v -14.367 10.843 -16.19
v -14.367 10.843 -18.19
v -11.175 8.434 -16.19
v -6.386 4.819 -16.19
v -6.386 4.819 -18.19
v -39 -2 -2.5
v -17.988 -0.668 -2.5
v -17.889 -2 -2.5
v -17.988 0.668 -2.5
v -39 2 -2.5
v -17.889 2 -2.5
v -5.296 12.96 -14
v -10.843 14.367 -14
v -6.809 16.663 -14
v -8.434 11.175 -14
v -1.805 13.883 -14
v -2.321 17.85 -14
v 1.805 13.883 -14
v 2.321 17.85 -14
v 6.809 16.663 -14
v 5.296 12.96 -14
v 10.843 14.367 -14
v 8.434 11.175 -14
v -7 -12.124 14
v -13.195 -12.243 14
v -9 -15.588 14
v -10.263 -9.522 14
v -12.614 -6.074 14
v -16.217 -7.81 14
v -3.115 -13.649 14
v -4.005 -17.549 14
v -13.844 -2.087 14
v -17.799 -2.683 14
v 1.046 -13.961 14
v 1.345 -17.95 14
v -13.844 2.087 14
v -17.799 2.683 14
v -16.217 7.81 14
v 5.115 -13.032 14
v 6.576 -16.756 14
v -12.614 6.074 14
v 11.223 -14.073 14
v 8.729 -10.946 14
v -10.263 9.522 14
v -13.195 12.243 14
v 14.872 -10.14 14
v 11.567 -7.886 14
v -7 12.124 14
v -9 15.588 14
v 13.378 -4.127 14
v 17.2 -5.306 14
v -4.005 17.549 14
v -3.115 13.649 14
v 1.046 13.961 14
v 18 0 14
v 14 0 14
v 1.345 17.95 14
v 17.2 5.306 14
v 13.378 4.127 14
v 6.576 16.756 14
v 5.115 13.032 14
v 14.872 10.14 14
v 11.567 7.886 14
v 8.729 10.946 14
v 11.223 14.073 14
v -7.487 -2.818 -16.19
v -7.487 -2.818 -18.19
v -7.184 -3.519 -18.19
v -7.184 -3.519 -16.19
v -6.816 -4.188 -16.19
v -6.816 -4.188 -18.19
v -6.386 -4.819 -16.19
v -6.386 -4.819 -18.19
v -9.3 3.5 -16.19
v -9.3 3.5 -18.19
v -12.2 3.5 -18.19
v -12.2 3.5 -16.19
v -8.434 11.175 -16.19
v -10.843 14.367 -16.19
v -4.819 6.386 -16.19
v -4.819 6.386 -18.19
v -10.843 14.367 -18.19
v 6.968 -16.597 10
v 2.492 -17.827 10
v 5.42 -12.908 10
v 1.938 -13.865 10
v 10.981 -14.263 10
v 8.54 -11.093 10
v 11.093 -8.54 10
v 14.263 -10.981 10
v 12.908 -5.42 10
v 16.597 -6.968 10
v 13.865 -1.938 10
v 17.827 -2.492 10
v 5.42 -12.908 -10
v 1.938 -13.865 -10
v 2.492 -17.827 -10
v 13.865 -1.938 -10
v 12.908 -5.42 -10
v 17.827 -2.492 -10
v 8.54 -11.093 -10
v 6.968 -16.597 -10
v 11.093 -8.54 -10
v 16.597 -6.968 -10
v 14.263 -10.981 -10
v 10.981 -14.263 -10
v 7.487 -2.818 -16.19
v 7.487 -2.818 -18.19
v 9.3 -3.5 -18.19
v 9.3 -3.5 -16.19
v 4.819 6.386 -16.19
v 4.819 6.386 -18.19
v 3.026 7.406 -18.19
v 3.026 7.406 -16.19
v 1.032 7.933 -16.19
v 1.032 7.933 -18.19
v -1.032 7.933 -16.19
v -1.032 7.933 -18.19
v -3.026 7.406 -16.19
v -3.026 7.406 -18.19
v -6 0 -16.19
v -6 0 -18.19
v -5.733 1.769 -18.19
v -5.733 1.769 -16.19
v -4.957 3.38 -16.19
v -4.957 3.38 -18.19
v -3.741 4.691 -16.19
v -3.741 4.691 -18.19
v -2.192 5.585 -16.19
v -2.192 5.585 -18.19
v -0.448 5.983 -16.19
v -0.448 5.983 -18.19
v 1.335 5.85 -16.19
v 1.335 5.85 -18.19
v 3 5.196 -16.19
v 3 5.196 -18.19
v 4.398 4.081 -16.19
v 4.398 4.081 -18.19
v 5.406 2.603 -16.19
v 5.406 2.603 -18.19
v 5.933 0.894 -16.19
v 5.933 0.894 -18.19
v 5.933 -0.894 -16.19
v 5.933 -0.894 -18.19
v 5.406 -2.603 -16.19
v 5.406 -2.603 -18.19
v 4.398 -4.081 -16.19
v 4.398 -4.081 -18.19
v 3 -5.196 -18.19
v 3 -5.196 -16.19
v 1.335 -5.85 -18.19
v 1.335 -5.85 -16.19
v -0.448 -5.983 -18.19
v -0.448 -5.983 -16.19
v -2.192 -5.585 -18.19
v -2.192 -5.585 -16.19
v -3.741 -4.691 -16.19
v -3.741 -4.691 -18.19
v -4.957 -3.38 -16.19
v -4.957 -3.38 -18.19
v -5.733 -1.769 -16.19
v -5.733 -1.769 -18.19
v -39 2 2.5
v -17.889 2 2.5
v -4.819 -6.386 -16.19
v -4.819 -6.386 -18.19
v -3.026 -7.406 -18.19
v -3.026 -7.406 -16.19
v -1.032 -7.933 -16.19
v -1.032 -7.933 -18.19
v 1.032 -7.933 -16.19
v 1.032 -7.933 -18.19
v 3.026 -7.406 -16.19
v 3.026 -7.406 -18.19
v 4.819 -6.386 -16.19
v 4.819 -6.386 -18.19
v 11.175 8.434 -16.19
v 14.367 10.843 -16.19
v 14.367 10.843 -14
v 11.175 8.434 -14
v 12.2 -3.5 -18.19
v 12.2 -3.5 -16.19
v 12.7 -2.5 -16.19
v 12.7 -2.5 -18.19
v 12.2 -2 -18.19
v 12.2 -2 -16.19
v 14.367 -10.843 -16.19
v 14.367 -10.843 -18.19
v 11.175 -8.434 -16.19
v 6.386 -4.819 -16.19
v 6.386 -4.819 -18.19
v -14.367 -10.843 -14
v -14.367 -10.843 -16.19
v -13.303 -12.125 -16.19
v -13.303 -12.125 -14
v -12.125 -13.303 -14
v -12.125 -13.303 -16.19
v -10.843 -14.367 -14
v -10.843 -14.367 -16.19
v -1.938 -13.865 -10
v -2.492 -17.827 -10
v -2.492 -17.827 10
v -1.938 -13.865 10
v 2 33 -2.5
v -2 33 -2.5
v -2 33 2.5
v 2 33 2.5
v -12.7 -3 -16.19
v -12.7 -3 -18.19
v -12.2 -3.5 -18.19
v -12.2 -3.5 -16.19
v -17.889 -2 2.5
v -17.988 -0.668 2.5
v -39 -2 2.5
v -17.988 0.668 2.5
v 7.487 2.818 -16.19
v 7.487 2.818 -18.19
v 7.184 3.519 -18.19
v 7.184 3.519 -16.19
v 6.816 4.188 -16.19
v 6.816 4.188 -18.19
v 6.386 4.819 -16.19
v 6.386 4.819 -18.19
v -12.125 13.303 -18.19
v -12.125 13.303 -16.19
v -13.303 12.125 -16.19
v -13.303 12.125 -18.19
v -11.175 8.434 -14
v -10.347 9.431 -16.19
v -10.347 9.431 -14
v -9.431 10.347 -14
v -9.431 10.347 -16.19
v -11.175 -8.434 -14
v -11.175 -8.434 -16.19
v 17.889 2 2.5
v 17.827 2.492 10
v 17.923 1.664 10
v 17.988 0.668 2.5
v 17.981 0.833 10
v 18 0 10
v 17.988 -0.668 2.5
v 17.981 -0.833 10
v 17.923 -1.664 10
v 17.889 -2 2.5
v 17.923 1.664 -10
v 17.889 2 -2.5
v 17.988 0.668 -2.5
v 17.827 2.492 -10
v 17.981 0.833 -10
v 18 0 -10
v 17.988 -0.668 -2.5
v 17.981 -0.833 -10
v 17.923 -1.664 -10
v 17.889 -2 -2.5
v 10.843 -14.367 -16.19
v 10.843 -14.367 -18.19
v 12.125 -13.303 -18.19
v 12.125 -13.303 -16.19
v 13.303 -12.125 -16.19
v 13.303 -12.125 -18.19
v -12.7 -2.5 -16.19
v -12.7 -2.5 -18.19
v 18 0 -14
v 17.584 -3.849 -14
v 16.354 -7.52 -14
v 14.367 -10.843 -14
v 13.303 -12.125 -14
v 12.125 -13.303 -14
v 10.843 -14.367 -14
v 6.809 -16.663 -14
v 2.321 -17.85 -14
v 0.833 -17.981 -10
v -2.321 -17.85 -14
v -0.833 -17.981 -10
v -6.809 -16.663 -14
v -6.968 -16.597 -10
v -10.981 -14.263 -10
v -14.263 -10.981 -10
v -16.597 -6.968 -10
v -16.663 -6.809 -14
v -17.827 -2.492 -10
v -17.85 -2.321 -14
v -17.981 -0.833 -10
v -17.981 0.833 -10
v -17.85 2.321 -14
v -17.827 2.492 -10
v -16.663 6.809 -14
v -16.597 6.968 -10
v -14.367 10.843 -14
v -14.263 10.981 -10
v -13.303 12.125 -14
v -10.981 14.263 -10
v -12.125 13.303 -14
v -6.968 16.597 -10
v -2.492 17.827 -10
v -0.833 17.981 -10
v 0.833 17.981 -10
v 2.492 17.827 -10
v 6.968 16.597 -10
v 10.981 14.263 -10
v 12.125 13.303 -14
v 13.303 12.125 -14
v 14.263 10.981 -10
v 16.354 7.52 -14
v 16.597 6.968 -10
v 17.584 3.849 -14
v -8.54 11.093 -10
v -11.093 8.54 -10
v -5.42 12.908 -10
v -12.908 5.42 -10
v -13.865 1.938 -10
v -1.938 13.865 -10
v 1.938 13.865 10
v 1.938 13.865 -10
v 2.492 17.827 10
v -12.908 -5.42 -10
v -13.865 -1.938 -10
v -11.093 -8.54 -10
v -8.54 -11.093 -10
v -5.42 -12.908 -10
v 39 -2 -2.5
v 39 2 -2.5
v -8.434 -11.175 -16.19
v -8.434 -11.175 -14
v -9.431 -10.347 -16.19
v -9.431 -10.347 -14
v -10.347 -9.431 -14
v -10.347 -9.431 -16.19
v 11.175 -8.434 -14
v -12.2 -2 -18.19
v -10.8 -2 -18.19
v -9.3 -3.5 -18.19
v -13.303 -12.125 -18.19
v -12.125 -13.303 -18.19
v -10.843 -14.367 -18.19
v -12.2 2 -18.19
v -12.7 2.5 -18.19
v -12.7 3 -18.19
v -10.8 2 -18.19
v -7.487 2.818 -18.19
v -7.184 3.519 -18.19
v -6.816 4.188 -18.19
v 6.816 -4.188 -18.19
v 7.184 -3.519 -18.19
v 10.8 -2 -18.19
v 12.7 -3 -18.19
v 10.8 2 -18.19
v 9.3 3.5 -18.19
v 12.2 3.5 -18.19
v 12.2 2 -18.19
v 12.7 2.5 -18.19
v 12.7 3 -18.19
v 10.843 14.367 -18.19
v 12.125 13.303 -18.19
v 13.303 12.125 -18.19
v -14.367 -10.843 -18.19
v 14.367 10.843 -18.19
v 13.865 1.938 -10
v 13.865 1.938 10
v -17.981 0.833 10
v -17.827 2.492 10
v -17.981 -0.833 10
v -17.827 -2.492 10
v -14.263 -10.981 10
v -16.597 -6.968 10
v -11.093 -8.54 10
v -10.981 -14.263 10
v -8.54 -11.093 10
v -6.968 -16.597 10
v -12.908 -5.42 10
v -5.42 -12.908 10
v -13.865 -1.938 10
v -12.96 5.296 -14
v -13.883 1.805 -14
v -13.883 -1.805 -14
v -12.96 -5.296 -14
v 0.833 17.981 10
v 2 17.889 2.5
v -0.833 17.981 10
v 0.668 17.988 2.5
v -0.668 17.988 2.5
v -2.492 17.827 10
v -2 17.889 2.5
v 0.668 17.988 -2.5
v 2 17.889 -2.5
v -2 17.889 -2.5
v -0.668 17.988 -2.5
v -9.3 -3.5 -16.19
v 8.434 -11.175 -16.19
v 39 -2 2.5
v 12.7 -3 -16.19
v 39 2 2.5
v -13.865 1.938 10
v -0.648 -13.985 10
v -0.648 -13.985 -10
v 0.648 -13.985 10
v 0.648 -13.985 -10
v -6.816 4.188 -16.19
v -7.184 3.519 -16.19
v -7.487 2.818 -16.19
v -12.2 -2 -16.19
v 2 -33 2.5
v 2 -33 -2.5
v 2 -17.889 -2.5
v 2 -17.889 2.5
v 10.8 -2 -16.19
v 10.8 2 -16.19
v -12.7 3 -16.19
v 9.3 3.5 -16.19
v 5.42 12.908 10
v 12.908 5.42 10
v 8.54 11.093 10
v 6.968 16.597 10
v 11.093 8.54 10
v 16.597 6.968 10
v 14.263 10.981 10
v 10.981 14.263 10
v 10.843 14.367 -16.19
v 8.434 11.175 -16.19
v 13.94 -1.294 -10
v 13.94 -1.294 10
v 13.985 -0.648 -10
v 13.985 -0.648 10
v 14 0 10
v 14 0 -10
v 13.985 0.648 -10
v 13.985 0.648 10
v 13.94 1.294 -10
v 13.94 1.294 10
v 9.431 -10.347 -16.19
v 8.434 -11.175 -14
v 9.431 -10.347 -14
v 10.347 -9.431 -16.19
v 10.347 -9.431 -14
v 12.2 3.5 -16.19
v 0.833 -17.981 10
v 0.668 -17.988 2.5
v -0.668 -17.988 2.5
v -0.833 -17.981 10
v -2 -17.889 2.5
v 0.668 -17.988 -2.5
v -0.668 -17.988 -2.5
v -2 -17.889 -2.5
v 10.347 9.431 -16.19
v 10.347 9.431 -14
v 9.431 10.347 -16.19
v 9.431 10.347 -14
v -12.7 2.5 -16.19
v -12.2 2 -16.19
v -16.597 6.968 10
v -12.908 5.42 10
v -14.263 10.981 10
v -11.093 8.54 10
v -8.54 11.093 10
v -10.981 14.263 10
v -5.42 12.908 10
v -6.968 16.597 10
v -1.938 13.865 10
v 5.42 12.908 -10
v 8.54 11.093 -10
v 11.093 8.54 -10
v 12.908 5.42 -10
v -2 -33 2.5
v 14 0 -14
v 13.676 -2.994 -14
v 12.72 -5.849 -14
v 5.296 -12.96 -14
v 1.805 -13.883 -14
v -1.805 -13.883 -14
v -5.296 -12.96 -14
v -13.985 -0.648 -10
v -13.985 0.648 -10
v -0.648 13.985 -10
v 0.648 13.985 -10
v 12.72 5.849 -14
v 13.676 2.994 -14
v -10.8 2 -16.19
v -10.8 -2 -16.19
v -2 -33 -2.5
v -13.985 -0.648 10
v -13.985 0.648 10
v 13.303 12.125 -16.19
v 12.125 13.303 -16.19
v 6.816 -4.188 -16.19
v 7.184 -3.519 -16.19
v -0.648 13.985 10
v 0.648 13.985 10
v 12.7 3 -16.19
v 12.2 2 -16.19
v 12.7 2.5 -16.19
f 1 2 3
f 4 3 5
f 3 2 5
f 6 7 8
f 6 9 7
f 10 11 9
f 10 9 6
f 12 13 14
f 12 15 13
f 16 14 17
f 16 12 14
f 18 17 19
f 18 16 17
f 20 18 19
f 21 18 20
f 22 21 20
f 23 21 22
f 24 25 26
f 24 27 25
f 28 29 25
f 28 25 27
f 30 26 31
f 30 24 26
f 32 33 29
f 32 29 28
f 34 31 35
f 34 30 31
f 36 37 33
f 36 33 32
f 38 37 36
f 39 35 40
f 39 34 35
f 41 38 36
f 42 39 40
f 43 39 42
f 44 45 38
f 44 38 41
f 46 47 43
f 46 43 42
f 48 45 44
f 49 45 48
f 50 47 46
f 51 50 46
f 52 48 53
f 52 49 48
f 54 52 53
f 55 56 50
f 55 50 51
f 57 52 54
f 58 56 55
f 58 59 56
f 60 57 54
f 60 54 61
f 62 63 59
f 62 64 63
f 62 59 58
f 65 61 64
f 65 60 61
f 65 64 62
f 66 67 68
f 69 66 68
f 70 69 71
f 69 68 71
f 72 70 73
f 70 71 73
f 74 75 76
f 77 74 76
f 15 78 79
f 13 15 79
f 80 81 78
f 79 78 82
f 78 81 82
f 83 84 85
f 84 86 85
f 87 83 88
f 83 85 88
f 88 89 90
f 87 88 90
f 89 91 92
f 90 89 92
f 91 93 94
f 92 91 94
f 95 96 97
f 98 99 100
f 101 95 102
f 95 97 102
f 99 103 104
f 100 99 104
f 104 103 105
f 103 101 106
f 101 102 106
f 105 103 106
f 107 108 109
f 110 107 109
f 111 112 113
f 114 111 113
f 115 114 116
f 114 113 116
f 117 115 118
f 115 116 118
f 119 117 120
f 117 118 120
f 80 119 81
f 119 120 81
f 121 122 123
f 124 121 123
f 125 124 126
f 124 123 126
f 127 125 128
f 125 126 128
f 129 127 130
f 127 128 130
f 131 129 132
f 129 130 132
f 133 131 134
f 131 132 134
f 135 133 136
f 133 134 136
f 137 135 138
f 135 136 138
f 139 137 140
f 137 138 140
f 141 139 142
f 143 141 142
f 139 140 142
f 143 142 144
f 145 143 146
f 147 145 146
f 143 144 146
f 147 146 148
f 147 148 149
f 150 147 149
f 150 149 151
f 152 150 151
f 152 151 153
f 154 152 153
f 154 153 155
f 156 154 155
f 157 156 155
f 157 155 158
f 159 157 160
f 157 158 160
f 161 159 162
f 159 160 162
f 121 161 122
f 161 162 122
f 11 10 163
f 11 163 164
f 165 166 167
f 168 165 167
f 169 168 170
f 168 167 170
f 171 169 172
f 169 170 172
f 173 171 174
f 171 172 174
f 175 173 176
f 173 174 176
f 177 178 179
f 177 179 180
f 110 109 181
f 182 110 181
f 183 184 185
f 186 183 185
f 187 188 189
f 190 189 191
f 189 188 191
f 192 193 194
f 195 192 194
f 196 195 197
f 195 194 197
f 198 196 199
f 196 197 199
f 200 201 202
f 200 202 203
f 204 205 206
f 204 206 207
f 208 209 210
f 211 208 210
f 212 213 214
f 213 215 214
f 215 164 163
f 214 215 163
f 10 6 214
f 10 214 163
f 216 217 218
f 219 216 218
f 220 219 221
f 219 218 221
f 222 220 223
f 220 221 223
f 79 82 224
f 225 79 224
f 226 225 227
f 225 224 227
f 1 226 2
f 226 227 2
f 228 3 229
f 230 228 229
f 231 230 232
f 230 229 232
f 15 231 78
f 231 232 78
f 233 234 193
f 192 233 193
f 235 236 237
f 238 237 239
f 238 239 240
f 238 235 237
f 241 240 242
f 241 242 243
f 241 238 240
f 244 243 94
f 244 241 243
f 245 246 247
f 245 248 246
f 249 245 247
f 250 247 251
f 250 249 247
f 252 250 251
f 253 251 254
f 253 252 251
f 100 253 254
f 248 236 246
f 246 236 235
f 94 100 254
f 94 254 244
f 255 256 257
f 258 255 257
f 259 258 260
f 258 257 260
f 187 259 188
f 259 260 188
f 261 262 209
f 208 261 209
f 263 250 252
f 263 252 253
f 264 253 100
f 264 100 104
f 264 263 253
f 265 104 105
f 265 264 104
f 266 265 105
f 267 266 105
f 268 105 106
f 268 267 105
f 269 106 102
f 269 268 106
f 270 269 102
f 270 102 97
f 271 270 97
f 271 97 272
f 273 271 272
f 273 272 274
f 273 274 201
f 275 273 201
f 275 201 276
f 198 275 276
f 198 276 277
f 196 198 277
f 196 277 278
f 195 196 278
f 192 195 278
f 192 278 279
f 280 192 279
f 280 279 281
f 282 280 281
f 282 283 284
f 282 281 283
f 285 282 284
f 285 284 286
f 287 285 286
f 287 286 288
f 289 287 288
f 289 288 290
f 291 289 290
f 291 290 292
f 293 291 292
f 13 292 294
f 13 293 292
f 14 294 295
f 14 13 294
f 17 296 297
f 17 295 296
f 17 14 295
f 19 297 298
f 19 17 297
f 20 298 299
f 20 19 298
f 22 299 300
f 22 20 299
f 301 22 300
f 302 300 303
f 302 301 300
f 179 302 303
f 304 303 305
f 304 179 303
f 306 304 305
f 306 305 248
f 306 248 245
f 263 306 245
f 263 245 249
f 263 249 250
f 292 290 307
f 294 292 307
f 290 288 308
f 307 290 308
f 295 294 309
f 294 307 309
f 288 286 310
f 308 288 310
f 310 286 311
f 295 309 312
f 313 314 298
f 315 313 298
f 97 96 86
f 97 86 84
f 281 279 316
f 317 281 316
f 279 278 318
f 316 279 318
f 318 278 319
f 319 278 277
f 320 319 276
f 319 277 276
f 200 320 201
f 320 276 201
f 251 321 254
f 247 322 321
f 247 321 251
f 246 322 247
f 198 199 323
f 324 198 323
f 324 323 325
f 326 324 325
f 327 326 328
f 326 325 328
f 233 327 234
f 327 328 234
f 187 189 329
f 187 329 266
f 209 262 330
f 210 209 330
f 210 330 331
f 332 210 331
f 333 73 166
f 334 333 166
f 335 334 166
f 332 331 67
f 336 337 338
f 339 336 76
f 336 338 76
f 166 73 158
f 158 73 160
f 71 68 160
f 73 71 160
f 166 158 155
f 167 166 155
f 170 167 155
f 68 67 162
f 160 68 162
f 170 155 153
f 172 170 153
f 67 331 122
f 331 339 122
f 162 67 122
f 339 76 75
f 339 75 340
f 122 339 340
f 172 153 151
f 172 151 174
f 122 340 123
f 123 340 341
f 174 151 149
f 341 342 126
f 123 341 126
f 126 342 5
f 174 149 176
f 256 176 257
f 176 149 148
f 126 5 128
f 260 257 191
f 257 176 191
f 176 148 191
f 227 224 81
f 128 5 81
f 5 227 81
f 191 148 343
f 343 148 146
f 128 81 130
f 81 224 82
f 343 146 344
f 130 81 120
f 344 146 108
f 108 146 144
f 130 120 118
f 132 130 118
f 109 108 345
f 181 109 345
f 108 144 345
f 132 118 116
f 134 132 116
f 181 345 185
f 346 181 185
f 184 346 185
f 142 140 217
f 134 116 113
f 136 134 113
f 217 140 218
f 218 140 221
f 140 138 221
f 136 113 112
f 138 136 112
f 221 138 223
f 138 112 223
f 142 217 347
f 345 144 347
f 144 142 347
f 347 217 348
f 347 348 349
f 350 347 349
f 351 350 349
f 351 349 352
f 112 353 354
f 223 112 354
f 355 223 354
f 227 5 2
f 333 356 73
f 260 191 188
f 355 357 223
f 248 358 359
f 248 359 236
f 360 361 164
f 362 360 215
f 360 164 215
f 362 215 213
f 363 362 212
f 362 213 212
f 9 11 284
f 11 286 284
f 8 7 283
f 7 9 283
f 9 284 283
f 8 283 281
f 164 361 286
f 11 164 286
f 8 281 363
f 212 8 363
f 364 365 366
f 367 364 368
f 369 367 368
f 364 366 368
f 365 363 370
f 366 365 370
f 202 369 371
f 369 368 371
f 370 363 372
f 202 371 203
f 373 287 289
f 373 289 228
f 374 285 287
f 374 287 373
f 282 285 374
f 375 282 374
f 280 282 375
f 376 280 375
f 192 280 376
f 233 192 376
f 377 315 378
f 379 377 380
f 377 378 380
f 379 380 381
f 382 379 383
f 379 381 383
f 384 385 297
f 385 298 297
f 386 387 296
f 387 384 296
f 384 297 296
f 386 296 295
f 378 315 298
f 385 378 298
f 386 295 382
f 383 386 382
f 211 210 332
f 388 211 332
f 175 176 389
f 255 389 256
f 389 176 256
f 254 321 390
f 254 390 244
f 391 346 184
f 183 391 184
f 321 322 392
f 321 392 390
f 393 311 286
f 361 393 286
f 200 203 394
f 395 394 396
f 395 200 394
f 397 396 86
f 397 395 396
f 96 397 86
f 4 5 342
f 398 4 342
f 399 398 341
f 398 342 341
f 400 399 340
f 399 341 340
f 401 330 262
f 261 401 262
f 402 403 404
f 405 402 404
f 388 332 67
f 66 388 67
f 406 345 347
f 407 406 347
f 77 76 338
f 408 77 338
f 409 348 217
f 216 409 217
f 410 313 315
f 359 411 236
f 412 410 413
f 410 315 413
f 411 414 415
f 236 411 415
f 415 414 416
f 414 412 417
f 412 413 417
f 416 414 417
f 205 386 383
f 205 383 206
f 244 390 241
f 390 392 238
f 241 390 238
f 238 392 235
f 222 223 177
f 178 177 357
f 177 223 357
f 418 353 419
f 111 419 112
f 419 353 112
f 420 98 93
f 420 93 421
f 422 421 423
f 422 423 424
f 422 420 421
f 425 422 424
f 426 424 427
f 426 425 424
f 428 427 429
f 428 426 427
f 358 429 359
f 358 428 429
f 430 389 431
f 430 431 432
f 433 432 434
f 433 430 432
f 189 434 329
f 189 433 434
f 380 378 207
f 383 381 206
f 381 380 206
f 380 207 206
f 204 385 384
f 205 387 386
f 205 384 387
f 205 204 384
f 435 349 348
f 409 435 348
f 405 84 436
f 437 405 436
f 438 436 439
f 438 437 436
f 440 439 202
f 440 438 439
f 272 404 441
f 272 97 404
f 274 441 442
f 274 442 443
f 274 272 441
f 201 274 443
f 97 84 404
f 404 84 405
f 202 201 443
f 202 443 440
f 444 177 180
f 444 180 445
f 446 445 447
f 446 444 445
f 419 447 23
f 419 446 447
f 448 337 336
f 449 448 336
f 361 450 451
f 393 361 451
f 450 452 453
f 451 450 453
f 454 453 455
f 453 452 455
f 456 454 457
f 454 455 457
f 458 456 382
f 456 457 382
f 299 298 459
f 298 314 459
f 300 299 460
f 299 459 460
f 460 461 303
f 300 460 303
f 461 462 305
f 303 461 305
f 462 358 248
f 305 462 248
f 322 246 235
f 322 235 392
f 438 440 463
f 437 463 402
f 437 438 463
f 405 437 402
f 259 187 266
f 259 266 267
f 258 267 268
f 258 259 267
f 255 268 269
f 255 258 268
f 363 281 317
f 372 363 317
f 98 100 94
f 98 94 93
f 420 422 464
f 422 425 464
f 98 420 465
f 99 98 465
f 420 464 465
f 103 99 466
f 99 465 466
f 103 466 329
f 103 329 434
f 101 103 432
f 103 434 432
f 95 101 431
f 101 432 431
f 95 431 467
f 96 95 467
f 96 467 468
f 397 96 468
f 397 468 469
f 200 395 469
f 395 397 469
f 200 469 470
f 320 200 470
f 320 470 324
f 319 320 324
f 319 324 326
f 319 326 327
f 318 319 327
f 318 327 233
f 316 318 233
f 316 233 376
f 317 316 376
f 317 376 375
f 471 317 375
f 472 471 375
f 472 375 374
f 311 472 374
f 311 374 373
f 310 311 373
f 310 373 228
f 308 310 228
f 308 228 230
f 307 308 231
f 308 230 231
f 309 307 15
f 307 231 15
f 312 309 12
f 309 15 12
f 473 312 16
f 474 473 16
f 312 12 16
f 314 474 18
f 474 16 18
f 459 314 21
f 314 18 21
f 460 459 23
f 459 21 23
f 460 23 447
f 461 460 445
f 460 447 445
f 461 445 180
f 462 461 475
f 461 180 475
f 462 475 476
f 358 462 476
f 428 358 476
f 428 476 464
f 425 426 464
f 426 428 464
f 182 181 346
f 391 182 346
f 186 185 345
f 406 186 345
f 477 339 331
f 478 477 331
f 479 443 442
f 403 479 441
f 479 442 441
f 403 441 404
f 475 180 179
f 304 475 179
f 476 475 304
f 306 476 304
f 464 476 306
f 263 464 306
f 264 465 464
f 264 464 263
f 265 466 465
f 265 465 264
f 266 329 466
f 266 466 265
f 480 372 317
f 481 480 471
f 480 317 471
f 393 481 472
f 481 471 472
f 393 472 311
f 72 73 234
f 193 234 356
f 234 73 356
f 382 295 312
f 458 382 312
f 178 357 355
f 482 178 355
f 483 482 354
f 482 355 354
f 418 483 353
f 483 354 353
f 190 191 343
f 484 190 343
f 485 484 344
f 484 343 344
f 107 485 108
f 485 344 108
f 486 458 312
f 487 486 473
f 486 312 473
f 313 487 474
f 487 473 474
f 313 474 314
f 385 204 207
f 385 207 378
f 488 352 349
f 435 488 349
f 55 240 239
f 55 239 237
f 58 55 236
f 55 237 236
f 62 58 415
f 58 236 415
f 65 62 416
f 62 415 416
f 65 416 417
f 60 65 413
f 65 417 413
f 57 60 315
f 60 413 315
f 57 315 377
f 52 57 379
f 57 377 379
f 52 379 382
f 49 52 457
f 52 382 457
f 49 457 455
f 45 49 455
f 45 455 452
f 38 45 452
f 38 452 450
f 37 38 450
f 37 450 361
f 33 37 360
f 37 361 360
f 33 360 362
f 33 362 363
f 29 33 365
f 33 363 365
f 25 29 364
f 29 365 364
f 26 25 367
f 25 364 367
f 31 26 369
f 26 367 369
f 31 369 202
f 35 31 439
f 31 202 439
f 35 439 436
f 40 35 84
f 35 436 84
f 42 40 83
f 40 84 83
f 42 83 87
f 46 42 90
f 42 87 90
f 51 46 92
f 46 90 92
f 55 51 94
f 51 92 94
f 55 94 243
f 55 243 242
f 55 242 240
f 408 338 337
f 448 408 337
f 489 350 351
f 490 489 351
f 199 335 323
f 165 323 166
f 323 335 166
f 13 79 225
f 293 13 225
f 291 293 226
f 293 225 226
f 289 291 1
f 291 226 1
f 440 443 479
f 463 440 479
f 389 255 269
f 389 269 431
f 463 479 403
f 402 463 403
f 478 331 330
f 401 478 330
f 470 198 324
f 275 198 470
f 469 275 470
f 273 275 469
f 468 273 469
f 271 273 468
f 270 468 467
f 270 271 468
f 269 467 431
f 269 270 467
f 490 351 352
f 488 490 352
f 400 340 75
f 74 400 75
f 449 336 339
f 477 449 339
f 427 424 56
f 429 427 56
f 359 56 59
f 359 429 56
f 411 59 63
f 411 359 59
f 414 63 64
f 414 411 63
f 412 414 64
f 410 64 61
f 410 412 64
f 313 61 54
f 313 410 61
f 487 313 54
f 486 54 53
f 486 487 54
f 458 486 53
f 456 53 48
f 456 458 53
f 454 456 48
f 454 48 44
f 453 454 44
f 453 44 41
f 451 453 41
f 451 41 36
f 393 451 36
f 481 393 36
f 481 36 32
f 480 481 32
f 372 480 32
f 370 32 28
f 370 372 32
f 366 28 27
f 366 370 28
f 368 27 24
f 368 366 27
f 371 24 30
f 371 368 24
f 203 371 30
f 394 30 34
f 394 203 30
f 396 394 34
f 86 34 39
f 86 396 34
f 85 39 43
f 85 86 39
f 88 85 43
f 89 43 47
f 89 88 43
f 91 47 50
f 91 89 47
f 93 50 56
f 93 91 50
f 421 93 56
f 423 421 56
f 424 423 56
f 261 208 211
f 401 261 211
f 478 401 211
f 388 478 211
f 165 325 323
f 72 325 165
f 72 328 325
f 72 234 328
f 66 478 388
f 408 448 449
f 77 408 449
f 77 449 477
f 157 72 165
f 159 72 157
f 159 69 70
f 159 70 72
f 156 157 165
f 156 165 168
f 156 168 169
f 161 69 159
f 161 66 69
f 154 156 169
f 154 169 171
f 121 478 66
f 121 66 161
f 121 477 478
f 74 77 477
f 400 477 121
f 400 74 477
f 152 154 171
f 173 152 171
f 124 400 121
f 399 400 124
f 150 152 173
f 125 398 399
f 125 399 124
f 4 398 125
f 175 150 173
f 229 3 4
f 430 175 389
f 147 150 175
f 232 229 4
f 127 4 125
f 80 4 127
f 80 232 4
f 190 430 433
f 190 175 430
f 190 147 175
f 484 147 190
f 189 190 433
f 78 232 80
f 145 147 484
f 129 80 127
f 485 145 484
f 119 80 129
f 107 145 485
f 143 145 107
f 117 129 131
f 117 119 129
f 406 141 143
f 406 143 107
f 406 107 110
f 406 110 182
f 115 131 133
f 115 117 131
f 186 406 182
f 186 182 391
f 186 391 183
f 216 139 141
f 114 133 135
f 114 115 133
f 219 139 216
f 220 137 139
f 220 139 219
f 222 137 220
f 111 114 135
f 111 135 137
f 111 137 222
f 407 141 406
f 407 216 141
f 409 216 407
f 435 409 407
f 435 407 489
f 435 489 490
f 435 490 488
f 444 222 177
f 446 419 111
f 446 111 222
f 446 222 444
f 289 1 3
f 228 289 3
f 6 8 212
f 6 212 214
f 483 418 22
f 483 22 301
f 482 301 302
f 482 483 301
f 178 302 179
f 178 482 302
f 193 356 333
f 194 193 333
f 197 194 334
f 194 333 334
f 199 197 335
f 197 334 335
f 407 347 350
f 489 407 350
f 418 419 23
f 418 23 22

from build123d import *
from build123d.topology import SkipClean

# Parameters (mm, degrees)
BOSS_EXTRUDE1_DEPTH        = 10
BOSS_EXTRUDE1_DEPTH_BACK   = 10
BOSS_EXTRUDE1_2_DEPTH      = 10
BOSS_EXTRUDE1_2_DEPTH_BACK = 10
BOSS_EXTRUDE1_3_DEPTH      = 10
BOSS_EXTRUDE1_3_DEPTH_BACK = 10
BOSS_EXTRUDE1_4_DEPTH      = 10
BOSS_EXTRUDE1_4_DEPTH_BACK = 10
SKETCH2_R                  = 18
SKETCH2_R_2                = 14
BOSS_EXTRUDE2_DEPTH        = 4
BOSS_EXTRUDE3_START        = 4
SKETCH3_R                  = 18
SKETCH3_R_2                = 14
BOSS_EXTRUDE3_DEPTH        = 4
BOSS_EXTRUDE4_START        = 2.19
BOSS_EXTRUDE4_DEPTH        = 2.19
BOSS_EXTRUDE5_START        = 2
SKETCH5_R                  = 6
BOSS_EXTRUDE5_DEPTH        = 2
BOSS_EXTRUDE6_DEPTH        = 2.5
BOSS_EXTRUDE6_DEPTH_BACK   = 2.5


with BuildPart() as part:
    # Sketch1 → Boss-Extrude1 (new, two sides: drawn at the far end of the back side and taken through both)
    with BuildSketch(Plane.XY.offset(-BOSS_EXTRUDE1_DEPTH_BACK)):
        with BuildLine():
            Line((-2.491970197, -17.826667791), (-1.938199042, -13.86518606))
            ThreePointArc((-1.938199042, -13.86518606), (0, -14), (1.938199042, -13.86518606))
            Line((1.938199042, -13.86518606), (2.491970197, -17.826667791))
            ThreePointArc((2.491970197, -17.826667791), (0, -18), (-2.491970197, -17.826667791))
        make_face()
    extrude(amount=BOSS_EXTRUDE1_DEPTH + BOSS_EXTRUDE1_DEPTH_BACK)



with BuildPart() as body_2:
    # Sketch1 → Boss-Extrude1 2 (new, two sides: drawn at the far end of the back side and taken through both)
    with BuildSketch(Plane.XY.offset(-BOSS_EXTRUDE1_2_DEPTH_BACK)):
        with BuildLine():
            Line((-17.826667791, -2.491970197), (-13.86518606, -1.938199042))
            ThreePointArc((-13.86518606, -1.938199042), (-14, 0), (-13.86518606, 1.938199042))
            Line((-13.86518606, 1.938199042), (-17.826667791, 2.491970197))
            ThreePointArc((-17.826667791, 2.491970197), (-18, 0), (-17.826667791, -2.491970197))
        make_face()
    extrude(amount=BOSS_EXTRUDE1_2_DEPTH + BOSS_EXTRUDE1_2_DEPTH_BACK)


with BuildPart() as body_3:
    # Sketch1 → Boss-Extrude1 3 (new, two sides: drawn at the far end of the back side and taken through both)
    with BuildSketch(Plane.XY.offset(-BOSS_EXTRUDE1_3_DEPTH_BACK)):
        with BuildLine():
            Line((-2.491970197, 17.826667791), (-1.938199042, 13.86518606))
            ThreePointArc((-1.938199042, 13.86518606), (0, 14), (1.938199042, 13.86518606))
            Line((1.938199042, 13.86518606), (2.491970197, 17.826667791))
            ThreePointArc((2.491970197, 17.826667791), (0, 18), (-2.491970197, 17.826667791))
        make_face()
    extrude(amount=BOSS_EXTRUDE1_3_DEPTH + BOSS_EXTRUDE1_3_DEPTH_BACK)


with BuildPart() as body_4:
    # Sketch1 → Boss-Extrude1 4 (new, two sides: drawn at the far end of the back side and taken through both)
    with BuildSketch(Plane.XY.offset(-BOSS_EXTRUDE1_4_DEPTH_BACK)):
        with BuildLine():
            Line((17.826667791, -2.491970197), (13.86518606, -1.938199042))
            ThreePointArc((13.86518606, -1.938199042), (14, 0), (13.86518606, 1.938199042))
            Line((13.86518606, 1.938199042), (17.826667791, 2.491970197))
            ThreePointArc((17.826667791, 2.491970197), (18, 0), (17.826667791, -2.491970197))
        make_face()
    extrude(amount=BOSS_EXTRUDE1_4_DEPTH + BOSS_EXTRUDE1_4_DEPTH_BACK)


with BuildPart() as part_1:
    with SkipClean():  # the faces are left unmerged after this step: merging them gives an invalid solid
        add(part.part)

        add(body_2.part)  # Boss-Extrude2 merges body 2

        add(body_3.part)  # Boss-Extrude2 merges body 3

        add(body_4.part)  # Boss-Extrude2 merges body 4
        # Sketch2 → Boss-Extrude2 (add)
        with BuildSketch(Plane.XY.offset(10)):
            Circle(SKETCH2_R)
            Circle(SKETCH2_R_2, mode=Mode.SUBTRACT)
        extrude(amount=BOSS_EXTRUDE2_DEPTH)

    # Sketch3 → Boss-Extrude3 (add)
    with SkipClean():  # the faces are left unmerged after this step: merging them gives an invalid solid
        with BuildSketch(Plane(origin=(0, 0, -10), x_dir=(-1, 0, 0), z_dir=(0, 0, -1)).offset(BOSS_EXTRUDE3_START)):
            Circle(SKETCH3_R)
            Circle(SKETCH3_R_2, mode=Mode.SUBTRACT)
        extrude(amount=-BOSS_EXTRUDE3_DEPTH)

    # Sketch4 → Boss-Extrude4 (add)
    with SkipClean():  # the faces are left unmerged after this step: merging them gives an invalid solid
        with BuildSketch(Plane(origin=(0, 0, -14), x_dir=(-1, 0, 0), z_dir=(0, 0, -1)).offset(BOSS_EXTRUDE4_START)):
            with BuildLine():
                Line((10.843268656, -14.367446706), (8.433653399, -11.174680771))
                ThreePointArc((8.433653399, -11.174680771), (9.899494937, -9.899494937), (11.174680771, -8.433653399))
                Line((11.174680771, -8.433653399), (14.367446706, -10.843268656))
                ThreePointArc((14.367446706, -10.843268656), (12.727922061, -12.727922061), (10.843268656, -14.367446706))
            make_face()
            with BuildLine():
                Line((-10.843268656, -14.367446706), (-8.433653399, -11.174680771))
                ThreePointArc((-8.433653399, -11.174680771), (-9.899494937, -9.899494937), (-11.174680771, -8.433653399))
                Line((-11.174680771, -8.433653399), (-14.367446706, -10.843268656))
                ThreePointArc((-14.367446706, -10.843268656), (-12.727922061, -12.727922061), (-10.843268656, -14.367446706))
            make_face()
            with BuildLine():
                Line((14.367446706, 10.843268656), (11.174680771, 8.433653399))
                ThreePointArc((11.174680771, 8.433653399), (9.899494937, 9.899494937), (8.433653399, 11.174680771))
                Line((8.433653399, 11.174680771), (10.843268656, 14.367446706))
                ThreePointArc((10.843268656, 14.367446706), (12.727922061, 12.727922061), (14.367446706, 10.843268656))
            make_face()
            with BuildLine():
                Line((-8.433653399, 11.174680771), (-10.843268656, 14.367446706))
                ThreePointArc((-10.843268656, 14.367446706), (-12.727922061, 12.727922061), (-14.367446706, 10.843268656))
                Line((-14.367446706, 10.843268656), (-11.174680771, 8.433653399))
                ThreePointArc((-11.174680771, 8.433653399), (-9.899494937, 9.899494937), (-8.433653399, 11.174680771))
            make_face()
        extrude(amount=-BOSS_EXTRUDE4_DEPTH)

    # Sketch5 → Boss-Extrude5 (add)
    with SkipClean():  # the faces are left unmerged after this step: merging them gives an invalid solid
        with BuildSketch(Plane(origin=(0, 0, -16.19), x_dir=(-1, 0, 0), z_dir=(0, 0, -1)).offset(BOSS_EXTRUDE5_START)):
            with BuildLine():
                Line((-10.843268656, 14.367446706), (-4.819230514, 6.385531869))
                ThreePointArc((-4.819230514, 6.385531869), (0, 8), (4.819230514, 6.385531869))
                Line((4.819230514, 6.385531869), (10.843268656, 14.367446706))
                ThreePointArc((10.843268656, 14.367446706), (12.727922061, 12.727922061), (14.367446706, 10.843268656))
                Line((14.367446706, 10.843268656), (6.385531869, 4.819230514))
                ThreePointArc((6.385531869, 4.819230514), (7.008239781, 3.858053288), (7.487319643, 2.817808468))
                Line((7.487319643, 2.817808468), (9.3, 3.5))
                Line((9.3, 3.5), (12.2, 3.5))
                Line((12.2, 3.5), (12.7, 3))
                Line((12.7, 3), (12.7, 2.5))
                Line((12.7, 2.5), (12.2, 2))
                Line((12.2, 2), (10.8, 2))
                Line((10.8, 2), (10.8, -2))
                Line((10.8, -2), (12.2, -2))
                Line((12.2, -2), (12.7, -2.5))
                Line((12.7, -2.5), (12.7, -3))
                Line((12.7, -3), (12.2, -3.5))
                Line((12.2, -3.5), (9.3, -3.5))
                Line((9.3, -3.5), (7.487319643, -2.817808468))
                ThreePointArc((7.487319643, -2.817808468), (7.008239781, -3.858053288), (6.385531869, -4.819230514))
                Line((6.385531869, -4.819230514), (14.367446706, -10.843268656))
                ThreePointArc((14.367446706, -10.843268656), (12.727922061, -12.727922061), (10.843268656, -14.367446706))
                Line((10.843268656, -14.367446706), (4.819230514, -6.385531869))
                ThreePointArc((4.819230514, -6.385531869), (0, -8), (-4.819230514, -6.385531869))
                Line((-4.819230514, -6.385531869), (-10.843268656, -14.367446706))
                ThreePointArc((-10.843268656, -14.367446706), (-12.727922061, -12.727922061), (-14.367446706, -10.843268656))
                Line((-14.367446706, -10.843268656), (-6.385531869, -4.819230514))
                ThreePointArc((-6.385531869, -4.819230514), (-7.008239781, -3.858053288), (-7.487319643, -2.817808468))
                Line((-7.487319643, -2.817808468), (-9.3, -3.5))
                Line((-9.3, -3.5), (-12.2, -3.5))
                Line((-12.2, -3.5), (-12.7, -3))
                Line((-12.7, -3), (-12.7, -2.5))
                Line((-12.7, -2.5), (-12.2, -2))
                Line((-12.2, -2), (-10.8, -2))
                Line((-10.8, -2), (-10.8, 2))
                Line((-10.8, 2), (-12.2, 2))
                Line((-12.2, 2), (-12.7, 2.5))
                Line((-12.7, 2.5), (-12.7, 3))
                Line((-12.7, 3), (-12.2, 3.5))
                Line((-12.2, 3.5), (-9.3, 3.5))
                Line((-9.3, 3.5), (-7.487319643, 2.817808468))
                ThreePointArc((-7.487319643, 2.817808468), (-7.008239781, 3.858053288), (-6.385531869, 4.819230514))
                Line((-6.385531869, 4.819230514), (-14.367446706, 10.843268656))
                ThreePointArc((-14.367446706, 10.843268656), (-12.727922061, 12.727922061), (-10.843268656, 14.367446706))
            make_face()
            Circle(SKETCH5_R, mode=Mode.SUBTRACT)
        extrude(amount=-BOSS_EXTRUDE5_DEPTH)

    # Sketch6 → Boss-Extrude6 (add, two sides: drawn at the far end of the back side and taken through both)
    with SkipClean():  # the faces are left unmerged after this step: merging them gives an invalid solid
        with BuildSketch(Plane.XY.offset(-BOSS_EXTRUDE6_DEPTH_BACK)):
            with BuildLine():
                Line((-39, 2), (-15.874507866, 2))
                ThreePointArc((-15.874507866, 2), (-16, 0), (-15.874507866, -2))
                Line((-15.874507866, -2), (-39, -2))
                Line((-39, -2), (-39, 2))
            make_face()
            with BuildLine():
                Line((39, 2), (39, -2))
                Line((39, -2), (15.874507866, -2))
                ThreePointArc((15.874507866, -2), (16, 0), (15.874507866, 2))
                Line((15.874507866, 2), (39, 2))
            make_face()
            with BuildLine():
                Line((-2, 33), (2, 33))
                Line((2, 33), (2, 15.874507866))
                ThreePointArc((2, 15.874507866), (0, 16), (-2, 15.874507866))
                Line((-2, 15.874507866), (-2, 33))
            make_face()
            with BuildLine():
                Line((-2, -33), (2, -33))
                Line((2, -33), (2, -15.874507866))
                ThreePointArc((2, -15.874507866), (0, -16), (-2, -15.874507866))
                Line((-2, -15.874507866), (-2, -33))
            make_face()
        extrude(amount=BOSS_EXTRUDE6_DEPTH + BOSS_EXTRUDE6_DEPTH_BACK)


solid = part_1.part
